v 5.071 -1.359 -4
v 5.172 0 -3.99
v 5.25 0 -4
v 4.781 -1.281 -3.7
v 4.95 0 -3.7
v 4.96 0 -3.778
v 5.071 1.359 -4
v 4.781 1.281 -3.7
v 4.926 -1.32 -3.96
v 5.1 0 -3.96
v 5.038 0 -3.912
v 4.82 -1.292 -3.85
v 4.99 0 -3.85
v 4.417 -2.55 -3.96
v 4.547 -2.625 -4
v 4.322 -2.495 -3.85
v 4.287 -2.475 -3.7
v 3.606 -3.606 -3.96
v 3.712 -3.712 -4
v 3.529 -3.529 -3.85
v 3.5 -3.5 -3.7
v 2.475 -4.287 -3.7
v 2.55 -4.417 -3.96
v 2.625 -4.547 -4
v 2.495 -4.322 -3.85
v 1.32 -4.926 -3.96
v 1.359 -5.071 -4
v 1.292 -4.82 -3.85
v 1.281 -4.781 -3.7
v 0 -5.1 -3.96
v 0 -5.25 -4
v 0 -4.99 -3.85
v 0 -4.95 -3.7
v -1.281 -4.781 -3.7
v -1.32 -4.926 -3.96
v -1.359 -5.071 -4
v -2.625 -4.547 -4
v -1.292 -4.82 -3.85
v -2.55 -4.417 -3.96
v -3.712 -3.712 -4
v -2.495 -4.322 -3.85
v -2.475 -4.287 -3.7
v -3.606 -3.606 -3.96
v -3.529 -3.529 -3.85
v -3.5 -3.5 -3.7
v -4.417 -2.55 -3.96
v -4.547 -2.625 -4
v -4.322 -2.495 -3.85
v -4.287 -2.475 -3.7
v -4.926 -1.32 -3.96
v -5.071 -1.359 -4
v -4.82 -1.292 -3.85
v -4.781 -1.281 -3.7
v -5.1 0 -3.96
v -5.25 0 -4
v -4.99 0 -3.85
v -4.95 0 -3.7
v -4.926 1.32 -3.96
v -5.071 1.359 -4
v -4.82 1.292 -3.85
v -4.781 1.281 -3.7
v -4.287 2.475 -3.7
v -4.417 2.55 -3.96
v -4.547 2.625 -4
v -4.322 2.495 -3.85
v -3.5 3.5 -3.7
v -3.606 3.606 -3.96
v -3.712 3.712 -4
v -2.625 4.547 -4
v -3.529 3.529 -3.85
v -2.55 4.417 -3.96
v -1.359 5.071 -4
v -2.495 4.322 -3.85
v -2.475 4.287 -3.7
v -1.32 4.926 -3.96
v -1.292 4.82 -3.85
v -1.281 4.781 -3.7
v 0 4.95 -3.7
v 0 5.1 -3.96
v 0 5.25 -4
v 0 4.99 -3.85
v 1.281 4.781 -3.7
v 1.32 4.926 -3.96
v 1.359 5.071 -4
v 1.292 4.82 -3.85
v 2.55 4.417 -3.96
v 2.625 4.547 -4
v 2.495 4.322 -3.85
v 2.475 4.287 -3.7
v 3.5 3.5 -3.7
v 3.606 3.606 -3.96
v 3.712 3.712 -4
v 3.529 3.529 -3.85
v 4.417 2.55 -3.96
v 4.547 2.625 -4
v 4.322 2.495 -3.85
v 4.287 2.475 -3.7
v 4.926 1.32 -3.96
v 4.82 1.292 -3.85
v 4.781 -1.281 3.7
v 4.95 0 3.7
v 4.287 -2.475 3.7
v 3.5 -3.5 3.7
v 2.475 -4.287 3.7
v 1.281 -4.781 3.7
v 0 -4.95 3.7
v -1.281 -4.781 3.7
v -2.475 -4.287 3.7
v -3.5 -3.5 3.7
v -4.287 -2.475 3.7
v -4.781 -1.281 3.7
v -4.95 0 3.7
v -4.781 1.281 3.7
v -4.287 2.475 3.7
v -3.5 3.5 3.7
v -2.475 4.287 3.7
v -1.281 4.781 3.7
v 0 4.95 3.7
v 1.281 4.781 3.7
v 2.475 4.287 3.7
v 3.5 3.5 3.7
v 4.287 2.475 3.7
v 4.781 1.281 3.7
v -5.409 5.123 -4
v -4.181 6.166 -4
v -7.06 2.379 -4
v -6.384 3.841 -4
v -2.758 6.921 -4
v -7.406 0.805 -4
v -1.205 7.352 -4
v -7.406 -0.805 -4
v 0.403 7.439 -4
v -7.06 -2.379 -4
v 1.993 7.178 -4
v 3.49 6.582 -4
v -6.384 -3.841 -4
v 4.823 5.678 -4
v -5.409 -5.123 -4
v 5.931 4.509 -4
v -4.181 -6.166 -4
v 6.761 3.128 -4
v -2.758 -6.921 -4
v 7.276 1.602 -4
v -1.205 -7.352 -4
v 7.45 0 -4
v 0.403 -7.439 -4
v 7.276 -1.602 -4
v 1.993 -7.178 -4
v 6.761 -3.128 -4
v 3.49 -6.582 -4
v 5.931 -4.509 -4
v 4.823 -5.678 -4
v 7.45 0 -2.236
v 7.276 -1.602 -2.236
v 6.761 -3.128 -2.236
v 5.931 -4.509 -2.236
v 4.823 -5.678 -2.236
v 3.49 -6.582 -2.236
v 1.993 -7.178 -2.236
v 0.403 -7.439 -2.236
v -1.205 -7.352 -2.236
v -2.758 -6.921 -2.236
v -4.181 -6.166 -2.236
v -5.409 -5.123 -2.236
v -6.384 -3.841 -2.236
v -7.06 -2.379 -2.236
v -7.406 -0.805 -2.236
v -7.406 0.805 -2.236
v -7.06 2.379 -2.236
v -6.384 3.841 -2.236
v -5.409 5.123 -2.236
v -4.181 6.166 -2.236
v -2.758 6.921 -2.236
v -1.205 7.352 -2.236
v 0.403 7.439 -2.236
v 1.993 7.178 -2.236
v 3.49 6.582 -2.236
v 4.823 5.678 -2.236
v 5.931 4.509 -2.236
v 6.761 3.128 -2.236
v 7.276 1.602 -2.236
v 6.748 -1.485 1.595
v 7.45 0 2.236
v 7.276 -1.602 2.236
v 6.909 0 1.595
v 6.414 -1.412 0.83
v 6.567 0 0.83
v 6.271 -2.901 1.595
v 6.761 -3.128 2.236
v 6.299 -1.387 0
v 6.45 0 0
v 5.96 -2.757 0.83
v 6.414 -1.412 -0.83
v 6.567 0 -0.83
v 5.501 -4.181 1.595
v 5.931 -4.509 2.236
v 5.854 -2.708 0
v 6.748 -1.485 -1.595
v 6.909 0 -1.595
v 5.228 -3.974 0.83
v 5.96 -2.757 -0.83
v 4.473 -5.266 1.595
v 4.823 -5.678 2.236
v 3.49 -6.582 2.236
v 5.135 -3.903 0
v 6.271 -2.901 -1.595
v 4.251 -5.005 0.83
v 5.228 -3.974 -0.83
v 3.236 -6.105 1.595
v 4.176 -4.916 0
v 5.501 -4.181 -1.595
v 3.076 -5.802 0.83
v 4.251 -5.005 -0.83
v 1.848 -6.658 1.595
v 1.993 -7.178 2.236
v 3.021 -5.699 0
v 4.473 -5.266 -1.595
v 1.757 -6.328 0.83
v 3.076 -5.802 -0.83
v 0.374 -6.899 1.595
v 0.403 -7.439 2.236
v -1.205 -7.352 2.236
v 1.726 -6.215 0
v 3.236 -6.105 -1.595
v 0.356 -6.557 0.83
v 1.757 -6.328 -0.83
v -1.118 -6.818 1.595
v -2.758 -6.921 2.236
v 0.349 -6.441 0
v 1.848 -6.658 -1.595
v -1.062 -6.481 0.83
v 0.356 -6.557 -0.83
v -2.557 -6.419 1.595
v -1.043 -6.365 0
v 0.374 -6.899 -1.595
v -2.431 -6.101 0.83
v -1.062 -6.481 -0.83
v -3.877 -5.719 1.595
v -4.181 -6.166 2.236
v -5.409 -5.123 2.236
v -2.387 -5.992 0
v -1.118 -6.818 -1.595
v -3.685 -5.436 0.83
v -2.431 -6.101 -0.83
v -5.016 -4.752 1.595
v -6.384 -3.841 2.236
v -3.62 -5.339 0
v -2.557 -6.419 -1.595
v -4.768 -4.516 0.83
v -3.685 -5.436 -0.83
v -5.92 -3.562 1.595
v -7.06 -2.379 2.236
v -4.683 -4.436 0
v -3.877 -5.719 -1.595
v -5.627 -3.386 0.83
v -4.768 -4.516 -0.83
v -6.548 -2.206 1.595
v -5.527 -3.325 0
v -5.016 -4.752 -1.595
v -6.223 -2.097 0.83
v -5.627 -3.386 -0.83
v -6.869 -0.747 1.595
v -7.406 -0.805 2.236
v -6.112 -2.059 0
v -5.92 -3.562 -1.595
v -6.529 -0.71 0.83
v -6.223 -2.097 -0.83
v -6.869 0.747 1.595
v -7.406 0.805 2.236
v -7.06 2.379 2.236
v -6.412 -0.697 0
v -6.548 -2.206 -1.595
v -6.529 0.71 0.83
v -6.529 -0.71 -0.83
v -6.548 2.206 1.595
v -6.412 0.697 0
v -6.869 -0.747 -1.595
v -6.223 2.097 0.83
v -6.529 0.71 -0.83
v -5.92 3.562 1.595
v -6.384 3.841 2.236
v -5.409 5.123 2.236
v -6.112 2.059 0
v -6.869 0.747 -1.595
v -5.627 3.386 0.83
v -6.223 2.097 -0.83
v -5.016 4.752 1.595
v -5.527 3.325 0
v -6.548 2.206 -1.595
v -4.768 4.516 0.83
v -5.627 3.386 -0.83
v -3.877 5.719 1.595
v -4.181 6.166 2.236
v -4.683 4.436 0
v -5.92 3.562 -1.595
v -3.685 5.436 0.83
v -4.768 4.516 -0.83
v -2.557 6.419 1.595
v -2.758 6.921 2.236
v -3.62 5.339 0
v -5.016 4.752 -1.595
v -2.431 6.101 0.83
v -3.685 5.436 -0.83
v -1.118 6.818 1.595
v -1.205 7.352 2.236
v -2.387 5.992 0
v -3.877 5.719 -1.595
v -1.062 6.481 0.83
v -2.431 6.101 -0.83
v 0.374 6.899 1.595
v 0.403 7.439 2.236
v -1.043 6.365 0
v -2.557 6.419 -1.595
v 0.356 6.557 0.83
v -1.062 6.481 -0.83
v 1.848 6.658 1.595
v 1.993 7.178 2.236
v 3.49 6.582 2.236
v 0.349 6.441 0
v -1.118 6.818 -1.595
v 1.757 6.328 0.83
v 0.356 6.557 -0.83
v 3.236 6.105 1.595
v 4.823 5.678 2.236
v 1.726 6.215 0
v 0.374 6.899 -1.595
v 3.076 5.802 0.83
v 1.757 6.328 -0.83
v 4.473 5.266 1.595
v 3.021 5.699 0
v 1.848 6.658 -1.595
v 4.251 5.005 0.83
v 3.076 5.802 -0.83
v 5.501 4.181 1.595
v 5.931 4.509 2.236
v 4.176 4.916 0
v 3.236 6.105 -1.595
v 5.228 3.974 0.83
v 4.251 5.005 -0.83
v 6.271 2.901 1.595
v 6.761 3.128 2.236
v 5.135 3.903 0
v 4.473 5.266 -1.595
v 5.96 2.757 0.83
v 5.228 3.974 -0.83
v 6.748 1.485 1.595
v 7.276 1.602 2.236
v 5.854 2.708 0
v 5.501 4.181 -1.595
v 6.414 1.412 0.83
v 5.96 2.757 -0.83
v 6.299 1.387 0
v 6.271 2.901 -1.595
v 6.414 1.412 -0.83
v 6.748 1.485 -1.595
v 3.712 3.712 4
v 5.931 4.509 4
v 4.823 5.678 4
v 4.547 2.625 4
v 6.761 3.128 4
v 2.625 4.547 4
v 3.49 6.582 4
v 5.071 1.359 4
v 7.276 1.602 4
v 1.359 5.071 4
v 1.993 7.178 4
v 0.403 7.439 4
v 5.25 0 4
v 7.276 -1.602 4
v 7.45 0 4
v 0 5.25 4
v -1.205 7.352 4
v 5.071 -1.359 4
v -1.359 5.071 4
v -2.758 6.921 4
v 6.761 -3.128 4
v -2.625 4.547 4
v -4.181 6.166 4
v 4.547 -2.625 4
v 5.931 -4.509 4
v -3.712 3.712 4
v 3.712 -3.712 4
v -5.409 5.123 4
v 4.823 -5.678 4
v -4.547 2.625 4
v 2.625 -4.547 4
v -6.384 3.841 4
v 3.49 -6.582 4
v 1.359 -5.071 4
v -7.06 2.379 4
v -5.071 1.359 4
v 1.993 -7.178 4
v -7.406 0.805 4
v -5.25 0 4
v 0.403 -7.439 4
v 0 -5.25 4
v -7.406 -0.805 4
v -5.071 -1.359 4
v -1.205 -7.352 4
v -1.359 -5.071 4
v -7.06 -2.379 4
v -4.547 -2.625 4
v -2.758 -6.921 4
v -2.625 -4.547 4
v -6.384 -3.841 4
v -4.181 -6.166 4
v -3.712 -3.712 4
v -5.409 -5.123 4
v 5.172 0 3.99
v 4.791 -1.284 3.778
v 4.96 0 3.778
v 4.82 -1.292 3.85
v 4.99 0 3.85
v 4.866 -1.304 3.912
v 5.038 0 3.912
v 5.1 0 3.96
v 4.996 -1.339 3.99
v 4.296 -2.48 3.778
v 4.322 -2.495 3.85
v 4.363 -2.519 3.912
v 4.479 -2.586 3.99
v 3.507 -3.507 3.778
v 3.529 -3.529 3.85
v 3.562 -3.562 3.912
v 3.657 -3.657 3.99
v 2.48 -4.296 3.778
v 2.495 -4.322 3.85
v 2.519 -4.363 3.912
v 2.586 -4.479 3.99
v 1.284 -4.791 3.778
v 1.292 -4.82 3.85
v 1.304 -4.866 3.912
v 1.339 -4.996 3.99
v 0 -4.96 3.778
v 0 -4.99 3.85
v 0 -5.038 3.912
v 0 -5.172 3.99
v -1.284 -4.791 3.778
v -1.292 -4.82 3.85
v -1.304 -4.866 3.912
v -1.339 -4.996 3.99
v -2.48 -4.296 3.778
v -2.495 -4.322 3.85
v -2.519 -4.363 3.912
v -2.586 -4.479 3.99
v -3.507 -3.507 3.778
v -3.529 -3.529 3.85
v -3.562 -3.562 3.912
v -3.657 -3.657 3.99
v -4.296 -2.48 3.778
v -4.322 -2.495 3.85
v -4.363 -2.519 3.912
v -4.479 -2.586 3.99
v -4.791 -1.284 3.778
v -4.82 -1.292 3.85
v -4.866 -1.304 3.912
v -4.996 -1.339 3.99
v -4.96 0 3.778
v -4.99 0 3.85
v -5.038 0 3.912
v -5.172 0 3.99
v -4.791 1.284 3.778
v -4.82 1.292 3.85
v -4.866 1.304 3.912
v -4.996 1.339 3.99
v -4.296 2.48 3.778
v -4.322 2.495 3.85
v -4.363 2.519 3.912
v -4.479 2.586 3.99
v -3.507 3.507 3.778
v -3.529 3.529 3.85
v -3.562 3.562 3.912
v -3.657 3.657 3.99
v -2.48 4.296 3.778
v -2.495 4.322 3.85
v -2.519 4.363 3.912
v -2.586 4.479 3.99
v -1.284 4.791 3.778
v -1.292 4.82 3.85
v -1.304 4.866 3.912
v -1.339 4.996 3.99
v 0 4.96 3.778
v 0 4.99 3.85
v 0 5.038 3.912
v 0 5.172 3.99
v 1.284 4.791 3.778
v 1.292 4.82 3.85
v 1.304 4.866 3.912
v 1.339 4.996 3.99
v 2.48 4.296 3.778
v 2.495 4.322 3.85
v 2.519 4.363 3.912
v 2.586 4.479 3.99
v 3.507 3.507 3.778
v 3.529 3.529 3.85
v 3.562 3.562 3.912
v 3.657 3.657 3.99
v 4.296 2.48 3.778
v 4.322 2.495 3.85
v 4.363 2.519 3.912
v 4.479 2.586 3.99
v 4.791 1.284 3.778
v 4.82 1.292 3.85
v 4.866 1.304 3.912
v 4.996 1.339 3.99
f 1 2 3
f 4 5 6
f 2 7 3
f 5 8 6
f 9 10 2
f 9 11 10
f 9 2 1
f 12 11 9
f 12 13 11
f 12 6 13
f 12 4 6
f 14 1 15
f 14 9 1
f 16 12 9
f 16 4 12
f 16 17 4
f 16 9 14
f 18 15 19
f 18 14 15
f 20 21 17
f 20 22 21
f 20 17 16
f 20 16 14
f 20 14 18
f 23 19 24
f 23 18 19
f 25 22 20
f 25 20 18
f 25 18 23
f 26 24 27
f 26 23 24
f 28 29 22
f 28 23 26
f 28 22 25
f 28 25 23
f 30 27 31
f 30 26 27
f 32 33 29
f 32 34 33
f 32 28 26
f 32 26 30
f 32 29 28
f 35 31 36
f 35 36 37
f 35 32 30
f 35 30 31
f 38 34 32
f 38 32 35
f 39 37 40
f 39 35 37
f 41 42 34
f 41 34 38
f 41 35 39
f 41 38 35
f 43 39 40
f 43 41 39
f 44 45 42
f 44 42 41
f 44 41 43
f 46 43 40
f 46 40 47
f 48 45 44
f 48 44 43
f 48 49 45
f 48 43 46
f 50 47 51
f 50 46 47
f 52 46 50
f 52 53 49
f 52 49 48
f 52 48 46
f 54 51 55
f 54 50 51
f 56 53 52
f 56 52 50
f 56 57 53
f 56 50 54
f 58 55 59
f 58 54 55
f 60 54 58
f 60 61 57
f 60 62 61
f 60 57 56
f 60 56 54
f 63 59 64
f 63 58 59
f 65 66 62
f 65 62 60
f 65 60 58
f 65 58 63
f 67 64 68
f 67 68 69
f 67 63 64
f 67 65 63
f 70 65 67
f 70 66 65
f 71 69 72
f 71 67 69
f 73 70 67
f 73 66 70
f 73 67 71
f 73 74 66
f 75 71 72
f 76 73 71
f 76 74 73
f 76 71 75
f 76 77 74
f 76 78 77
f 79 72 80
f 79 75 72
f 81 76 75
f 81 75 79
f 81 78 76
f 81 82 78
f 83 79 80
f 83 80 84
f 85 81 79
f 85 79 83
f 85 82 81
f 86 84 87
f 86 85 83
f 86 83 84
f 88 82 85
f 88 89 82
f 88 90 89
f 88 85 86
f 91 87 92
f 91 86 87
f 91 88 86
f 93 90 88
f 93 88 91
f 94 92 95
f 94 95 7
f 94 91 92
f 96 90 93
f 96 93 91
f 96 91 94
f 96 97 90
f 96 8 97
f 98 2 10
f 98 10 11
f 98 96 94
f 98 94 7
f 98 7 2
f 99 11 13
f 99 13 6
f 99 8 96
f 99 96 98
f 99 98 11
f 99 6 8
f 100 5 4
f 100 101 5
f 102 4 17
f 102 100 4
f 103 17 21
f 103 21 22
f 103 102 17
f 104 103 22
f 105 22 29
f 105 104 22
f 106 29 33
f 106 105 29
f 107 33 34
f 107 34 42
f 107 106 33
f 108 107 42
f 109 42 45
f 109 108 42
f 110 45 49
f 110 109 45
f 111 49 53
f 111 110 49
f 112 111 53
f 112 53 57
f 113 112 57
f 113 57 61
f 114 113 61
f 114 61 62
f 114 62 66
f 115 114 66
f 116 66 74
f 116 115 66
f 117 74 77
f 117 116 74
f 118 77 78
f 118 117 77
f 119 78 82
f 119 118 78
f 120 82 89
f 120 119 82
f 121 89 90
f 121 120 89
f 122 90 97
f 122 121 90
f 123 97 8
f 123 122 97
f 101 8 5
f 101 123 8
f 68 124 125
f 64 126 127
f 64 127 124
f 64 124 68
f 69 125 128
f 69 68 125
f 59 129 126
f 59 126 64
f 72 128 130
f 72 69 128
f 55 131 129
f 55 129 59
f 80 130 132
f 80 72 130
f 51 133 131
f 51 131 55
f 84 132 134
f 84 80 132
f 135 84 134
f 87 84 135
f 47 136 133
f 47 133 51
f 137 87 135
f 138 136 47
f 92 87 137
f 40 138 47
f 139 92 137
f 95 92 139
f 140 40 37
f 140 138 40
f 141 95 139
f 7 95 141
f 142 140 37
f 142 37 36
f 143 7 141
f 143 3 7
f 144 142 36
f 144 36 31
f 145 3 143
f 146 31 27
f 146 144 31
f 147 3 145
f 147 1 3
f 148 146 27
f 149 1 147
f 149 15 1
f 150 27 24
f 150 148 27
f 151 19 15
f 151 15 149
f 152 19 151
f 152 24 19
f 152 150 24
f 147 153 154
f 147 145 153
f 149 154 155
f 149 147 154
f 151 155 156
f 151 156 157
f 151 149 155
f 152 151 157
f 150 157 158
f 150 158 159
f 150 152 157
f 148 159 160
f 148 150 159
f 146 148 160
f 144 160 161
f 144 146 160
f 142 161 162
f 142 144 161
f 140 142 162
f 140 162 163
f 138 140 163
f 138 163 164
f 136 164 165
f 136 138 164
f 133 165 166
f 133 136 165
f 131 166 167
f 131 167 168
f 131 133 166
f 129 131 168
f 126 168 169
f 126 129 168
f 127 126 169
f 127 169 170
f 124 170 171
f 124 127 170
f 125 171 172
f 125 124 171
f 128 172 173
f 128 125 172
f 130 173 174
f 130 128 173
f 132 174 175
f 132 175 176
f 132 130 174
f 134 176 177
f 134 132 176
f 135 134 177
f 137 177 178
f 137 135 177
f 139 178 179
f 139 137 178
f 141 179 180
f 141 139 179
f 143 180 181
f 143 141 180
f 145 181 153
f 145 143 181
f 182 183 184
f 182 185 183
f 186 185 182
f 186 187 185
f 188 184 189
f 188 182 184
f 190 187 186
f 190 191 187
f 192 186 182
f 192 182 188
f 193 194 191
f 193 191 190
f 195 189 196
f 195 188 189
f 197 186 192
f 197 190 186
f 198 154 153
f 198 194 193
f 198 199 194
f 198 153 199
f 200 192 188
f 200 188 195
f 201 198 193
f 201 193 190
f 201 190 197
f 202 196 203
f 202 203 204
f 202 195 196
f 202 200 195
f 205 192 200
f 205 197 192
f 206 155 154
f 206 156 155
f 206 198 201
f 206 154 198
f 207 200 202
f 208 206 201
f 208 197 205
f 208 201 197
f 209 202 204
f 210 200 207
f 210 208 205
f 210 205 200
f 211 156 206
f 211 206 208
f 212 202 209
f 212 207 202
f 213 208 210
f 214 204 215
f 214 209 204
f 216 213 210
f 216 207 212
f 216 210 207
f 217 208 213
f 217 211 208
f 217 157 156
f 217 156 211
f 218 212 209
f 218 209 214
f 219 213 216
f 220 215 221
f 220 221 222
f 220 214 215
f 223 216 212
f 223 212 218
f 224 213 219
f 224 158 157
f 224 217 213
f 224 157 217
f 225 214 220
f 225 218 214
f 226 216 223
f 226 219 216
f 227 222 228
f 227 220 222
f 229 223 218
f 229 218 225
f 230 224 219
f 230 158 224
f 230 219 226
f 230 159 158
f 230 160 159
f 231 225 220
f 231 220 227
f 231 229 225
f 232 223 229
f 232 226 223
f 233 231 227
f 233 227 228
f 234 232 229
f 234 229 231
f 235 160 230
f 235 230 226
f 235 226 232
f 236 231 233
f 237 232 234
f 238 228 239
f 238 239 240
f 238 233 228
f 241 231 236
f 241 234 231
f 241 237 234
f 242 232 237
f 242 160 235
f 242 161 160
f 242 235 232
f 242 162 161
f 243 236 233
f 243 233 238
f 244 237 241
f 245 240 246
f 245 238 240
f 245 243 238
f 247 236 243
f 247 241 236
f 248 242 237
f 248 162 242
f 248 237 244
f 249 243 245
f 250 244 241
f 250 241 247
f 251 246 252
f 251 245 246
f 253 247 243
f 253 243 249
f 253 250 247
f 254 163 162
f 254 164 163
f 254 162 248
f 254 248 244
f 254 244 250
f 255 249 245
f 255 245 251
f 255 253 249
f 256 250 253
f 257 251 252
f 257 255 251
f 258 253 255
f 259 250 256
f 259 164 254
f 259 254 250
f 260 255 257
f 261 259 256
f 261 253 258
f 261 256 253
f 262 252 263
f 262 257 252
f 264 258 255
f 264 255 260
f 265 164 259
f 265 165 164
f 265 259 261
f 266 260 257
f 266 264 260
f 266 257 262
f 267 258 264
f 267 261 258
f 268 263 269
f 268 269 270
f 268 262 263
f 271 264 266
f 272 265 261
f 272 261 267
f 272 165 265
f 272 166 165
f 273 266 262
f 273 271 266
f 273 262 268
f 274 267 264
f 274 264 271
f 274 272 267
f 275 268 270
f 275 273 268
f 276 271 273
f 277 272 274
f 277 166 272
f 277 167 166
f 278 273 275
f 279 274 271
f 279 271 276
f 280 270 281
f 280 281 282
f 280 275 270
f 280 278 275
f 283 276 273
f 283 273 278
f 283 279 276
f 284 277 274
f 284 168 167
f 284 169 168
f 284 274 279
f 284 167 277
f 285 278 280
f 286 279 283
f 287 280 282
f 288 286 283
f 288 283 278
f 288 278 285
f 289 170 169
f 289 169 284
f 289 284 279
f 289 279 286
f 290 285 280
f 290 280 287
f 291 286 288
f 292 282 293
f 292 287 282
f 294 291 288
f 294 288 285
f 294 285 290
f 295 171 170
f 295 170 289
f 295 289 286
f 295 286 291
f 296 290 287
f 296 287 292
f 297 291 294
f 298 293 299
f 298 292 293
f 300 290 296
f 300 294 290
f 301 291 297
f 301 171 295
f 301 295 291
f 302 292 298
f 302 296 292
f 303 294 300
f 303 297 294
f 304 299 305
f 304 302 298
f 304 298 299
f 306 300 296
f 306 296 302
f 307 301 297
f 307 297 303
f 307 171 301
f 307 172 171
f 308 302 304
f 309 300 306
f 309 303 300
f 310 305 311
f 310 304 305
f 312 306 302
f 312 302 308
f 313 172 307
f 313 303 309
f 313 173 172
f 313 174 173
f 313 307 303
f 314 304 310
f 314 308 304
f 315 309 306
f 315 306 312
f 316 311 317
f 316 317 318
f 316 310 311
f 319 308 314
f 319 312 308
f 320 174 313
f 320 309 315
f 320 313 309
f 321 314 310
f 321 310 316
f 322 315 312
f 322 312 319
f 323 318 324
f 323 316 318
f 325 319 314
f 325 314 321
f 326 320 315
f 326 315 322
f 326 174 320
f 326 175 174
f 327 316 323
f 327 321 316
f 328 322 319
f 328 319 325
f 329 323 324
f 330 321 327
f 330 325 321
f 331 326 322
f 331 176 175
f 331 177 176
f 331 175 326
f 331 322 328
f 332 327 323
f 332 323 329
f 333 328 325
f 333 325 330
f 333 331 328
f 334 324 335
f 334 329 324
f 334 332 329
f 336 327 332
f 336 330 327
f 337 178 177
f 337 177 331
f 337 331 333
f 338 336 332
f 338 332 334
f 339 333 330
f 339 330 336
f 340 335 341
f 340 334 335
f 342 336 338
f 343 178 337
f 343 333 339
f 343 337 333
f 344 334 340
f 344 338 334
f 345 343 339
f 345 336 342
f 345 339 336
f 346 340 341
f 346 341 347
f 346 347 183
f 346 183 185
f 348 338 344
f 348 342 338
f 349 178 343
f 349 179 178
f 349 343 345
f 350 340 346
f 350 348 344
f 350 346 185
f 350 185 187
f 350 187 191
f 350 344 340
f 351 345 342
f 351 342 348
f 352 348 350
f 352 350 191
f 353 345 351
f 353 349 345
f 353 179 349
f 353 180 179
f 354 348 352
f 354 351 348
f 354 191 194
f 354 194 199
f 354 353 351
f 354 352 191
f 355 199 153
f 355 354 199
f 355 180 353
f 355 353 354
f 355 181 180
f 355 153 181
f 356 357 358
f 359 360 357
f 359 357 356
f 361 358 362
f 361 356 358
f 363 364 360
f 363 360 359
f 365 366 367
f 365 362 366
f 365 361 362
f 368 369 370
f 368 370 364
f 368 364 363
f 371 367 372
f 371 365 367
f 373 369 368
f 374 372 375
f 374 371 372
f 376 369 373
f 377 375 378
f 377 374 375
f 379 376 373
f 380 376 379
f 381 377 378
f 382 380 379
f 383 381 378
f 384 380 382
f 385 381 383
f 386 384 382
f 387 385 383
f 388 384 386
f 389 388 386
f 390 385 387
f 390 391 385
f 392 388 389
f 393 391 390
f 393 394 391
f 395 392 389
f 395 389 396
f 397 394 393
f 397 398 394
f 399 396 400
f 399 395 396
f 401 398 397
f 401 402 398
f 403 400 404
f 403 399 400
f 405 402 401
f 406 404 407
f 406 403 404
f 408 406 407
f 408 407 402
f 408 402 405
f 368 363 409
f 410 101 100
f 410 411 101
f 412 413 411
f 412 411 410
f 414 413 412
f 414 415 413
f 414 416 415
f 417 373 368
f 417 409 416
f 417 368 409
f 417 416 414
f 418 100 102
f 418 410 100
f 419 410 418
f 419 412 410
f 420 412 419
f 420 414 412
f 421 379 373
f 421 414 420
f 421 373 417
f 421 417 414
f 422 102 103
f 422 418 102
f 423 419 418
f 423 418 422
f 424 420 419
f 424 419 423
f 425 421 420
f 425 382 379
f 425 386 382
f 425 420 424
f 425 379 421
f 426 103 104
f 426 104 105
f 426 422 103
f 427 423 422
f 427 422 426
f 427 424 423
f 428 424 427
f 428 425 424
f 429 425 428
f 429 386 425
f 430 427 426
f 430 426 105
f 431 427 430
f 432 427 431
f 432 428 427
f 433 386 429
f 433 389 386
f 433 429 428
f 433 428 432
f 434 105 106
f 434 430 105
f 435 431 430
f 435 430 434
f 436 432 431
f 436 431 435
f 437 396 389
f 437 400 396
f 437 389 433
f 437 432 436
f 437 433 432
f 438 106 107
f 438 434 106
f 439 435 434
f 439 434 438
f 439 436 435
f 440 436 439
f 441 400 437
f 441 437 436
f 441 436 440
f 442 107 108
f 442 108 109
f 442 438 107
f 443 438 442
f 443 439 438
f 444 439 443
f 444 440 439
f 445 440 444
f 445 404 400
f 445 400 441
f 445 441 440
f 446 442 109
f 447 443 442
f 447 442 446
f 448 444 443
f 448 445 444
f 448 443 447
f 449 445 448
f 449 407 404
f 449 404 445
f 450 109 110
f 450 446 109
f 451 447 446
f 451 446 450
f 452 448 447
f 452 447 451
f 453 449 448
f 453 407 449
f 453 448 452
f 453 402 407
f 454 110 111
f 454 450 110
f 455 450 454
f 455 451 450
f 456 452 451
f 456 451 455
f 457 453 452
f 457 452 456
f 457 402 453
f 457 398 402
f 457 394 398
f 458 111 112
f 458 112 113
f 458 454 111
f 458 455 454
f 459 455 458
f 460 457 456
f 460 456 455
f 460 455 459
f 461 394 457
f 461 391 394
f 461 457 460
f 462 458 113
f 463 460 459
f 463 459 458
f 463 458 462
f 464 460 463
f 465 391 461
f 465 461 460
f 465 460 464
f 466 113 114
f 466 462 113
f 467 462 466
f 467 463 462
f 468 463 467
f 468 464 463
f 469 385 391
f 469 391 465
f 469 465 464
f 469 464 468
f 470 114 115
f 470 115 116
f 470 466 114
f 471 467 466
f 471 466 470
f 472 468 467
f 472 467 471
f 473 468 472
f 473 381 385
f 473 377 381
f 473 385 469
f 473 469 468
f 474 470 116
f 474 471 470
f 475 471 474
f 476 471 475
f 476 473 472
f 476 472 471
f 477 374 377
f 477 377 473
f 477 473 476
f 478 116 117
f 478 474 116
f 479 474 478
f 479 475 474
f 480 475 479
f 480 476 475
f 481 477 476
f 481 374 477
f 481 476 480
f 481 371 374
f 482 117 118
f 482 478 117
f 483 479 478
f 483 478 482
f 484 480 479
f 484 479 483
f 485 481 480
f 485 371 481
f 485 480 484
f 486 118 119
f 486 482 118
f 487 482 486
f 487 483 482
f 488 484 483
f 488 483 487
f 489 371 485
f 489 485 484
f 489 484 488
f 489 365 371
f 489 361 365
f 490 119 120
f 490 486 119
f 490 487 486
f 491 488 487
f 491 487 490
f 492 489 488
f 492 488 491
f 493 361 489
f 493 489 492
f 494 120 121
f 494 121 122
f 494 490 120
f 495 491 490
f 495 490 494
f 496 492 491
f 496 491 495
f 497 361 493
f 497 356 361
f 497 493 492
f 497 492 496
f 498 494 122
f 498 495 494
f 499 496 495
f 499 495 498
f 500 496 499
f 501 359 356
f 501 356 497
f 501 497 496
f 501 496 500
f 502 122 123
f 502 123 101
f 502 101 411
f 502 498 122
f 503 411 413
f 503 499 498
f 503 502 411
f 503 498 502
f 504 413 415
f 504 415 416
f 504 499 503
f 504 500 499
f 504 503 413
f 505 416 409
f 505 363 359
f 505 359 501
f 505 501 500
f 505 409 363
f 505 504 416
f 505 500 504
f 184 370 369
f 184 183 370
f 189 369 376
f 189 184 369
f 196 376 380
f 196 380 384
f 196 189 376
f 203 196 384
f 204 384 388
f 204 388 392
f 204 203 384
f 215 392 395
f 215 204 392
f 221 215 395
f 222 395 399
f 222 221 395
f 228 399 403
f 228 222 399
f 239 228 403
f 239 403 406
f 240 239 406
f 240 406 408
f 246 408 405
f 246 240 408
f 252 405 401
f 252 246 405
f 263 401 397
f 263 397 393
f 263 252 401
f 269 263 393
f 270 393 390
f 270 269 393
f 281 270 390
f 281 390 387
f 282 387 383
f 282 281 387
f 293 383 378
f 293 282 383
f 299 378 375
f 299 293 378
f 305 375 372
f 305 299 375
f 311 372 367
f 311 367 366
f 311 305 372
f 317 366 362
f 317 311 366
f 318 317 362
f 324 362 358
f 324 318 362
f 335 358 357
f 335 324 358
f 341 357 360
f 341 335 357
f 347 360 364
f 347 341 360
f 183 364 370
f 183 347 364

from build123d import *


with BuildPart() as part:
    # Sketch1 → Revolve1 (revolve)
    with BuildSketch(Plane(origin=(0, 0, 0), x_dir=(0, 0, -1), z_dir=(1, 0, 0)), mode=Mode.PRIVATE) as revolve1_sk:
        with BuildLine():
            Line((-4, 7.45), (-2.236067977, 7.45))
            ThreePointArc((-2.236067977, 7.45), (0, 6.45), (2.236067977, 7.45))
            Line((2.236067977, 7.45), (4, 7.45))
            Line((4, 7.45), (4, 5.25))
            ThreePointArc((4, 5.25), (3.912132034, 5.037867966), (3.7, 4.95))
            Line((3.7, 4.95), (-3.7, 4.95))
            ThreePointArc((-3.7, 4.95), (-3.912132034, 5.037867966), (-4, 5.25))
            Line((-4, 5.25), (-4, 7.45))
        make_face()
    revolve(revolve1_sk.sketch.rotate(Axis((0, 0, 7.419354839), (0, 0, -1)), 90), axis=Axis((0, 0, 7.419354839), (0, 0, -1)))


solid = part.part
